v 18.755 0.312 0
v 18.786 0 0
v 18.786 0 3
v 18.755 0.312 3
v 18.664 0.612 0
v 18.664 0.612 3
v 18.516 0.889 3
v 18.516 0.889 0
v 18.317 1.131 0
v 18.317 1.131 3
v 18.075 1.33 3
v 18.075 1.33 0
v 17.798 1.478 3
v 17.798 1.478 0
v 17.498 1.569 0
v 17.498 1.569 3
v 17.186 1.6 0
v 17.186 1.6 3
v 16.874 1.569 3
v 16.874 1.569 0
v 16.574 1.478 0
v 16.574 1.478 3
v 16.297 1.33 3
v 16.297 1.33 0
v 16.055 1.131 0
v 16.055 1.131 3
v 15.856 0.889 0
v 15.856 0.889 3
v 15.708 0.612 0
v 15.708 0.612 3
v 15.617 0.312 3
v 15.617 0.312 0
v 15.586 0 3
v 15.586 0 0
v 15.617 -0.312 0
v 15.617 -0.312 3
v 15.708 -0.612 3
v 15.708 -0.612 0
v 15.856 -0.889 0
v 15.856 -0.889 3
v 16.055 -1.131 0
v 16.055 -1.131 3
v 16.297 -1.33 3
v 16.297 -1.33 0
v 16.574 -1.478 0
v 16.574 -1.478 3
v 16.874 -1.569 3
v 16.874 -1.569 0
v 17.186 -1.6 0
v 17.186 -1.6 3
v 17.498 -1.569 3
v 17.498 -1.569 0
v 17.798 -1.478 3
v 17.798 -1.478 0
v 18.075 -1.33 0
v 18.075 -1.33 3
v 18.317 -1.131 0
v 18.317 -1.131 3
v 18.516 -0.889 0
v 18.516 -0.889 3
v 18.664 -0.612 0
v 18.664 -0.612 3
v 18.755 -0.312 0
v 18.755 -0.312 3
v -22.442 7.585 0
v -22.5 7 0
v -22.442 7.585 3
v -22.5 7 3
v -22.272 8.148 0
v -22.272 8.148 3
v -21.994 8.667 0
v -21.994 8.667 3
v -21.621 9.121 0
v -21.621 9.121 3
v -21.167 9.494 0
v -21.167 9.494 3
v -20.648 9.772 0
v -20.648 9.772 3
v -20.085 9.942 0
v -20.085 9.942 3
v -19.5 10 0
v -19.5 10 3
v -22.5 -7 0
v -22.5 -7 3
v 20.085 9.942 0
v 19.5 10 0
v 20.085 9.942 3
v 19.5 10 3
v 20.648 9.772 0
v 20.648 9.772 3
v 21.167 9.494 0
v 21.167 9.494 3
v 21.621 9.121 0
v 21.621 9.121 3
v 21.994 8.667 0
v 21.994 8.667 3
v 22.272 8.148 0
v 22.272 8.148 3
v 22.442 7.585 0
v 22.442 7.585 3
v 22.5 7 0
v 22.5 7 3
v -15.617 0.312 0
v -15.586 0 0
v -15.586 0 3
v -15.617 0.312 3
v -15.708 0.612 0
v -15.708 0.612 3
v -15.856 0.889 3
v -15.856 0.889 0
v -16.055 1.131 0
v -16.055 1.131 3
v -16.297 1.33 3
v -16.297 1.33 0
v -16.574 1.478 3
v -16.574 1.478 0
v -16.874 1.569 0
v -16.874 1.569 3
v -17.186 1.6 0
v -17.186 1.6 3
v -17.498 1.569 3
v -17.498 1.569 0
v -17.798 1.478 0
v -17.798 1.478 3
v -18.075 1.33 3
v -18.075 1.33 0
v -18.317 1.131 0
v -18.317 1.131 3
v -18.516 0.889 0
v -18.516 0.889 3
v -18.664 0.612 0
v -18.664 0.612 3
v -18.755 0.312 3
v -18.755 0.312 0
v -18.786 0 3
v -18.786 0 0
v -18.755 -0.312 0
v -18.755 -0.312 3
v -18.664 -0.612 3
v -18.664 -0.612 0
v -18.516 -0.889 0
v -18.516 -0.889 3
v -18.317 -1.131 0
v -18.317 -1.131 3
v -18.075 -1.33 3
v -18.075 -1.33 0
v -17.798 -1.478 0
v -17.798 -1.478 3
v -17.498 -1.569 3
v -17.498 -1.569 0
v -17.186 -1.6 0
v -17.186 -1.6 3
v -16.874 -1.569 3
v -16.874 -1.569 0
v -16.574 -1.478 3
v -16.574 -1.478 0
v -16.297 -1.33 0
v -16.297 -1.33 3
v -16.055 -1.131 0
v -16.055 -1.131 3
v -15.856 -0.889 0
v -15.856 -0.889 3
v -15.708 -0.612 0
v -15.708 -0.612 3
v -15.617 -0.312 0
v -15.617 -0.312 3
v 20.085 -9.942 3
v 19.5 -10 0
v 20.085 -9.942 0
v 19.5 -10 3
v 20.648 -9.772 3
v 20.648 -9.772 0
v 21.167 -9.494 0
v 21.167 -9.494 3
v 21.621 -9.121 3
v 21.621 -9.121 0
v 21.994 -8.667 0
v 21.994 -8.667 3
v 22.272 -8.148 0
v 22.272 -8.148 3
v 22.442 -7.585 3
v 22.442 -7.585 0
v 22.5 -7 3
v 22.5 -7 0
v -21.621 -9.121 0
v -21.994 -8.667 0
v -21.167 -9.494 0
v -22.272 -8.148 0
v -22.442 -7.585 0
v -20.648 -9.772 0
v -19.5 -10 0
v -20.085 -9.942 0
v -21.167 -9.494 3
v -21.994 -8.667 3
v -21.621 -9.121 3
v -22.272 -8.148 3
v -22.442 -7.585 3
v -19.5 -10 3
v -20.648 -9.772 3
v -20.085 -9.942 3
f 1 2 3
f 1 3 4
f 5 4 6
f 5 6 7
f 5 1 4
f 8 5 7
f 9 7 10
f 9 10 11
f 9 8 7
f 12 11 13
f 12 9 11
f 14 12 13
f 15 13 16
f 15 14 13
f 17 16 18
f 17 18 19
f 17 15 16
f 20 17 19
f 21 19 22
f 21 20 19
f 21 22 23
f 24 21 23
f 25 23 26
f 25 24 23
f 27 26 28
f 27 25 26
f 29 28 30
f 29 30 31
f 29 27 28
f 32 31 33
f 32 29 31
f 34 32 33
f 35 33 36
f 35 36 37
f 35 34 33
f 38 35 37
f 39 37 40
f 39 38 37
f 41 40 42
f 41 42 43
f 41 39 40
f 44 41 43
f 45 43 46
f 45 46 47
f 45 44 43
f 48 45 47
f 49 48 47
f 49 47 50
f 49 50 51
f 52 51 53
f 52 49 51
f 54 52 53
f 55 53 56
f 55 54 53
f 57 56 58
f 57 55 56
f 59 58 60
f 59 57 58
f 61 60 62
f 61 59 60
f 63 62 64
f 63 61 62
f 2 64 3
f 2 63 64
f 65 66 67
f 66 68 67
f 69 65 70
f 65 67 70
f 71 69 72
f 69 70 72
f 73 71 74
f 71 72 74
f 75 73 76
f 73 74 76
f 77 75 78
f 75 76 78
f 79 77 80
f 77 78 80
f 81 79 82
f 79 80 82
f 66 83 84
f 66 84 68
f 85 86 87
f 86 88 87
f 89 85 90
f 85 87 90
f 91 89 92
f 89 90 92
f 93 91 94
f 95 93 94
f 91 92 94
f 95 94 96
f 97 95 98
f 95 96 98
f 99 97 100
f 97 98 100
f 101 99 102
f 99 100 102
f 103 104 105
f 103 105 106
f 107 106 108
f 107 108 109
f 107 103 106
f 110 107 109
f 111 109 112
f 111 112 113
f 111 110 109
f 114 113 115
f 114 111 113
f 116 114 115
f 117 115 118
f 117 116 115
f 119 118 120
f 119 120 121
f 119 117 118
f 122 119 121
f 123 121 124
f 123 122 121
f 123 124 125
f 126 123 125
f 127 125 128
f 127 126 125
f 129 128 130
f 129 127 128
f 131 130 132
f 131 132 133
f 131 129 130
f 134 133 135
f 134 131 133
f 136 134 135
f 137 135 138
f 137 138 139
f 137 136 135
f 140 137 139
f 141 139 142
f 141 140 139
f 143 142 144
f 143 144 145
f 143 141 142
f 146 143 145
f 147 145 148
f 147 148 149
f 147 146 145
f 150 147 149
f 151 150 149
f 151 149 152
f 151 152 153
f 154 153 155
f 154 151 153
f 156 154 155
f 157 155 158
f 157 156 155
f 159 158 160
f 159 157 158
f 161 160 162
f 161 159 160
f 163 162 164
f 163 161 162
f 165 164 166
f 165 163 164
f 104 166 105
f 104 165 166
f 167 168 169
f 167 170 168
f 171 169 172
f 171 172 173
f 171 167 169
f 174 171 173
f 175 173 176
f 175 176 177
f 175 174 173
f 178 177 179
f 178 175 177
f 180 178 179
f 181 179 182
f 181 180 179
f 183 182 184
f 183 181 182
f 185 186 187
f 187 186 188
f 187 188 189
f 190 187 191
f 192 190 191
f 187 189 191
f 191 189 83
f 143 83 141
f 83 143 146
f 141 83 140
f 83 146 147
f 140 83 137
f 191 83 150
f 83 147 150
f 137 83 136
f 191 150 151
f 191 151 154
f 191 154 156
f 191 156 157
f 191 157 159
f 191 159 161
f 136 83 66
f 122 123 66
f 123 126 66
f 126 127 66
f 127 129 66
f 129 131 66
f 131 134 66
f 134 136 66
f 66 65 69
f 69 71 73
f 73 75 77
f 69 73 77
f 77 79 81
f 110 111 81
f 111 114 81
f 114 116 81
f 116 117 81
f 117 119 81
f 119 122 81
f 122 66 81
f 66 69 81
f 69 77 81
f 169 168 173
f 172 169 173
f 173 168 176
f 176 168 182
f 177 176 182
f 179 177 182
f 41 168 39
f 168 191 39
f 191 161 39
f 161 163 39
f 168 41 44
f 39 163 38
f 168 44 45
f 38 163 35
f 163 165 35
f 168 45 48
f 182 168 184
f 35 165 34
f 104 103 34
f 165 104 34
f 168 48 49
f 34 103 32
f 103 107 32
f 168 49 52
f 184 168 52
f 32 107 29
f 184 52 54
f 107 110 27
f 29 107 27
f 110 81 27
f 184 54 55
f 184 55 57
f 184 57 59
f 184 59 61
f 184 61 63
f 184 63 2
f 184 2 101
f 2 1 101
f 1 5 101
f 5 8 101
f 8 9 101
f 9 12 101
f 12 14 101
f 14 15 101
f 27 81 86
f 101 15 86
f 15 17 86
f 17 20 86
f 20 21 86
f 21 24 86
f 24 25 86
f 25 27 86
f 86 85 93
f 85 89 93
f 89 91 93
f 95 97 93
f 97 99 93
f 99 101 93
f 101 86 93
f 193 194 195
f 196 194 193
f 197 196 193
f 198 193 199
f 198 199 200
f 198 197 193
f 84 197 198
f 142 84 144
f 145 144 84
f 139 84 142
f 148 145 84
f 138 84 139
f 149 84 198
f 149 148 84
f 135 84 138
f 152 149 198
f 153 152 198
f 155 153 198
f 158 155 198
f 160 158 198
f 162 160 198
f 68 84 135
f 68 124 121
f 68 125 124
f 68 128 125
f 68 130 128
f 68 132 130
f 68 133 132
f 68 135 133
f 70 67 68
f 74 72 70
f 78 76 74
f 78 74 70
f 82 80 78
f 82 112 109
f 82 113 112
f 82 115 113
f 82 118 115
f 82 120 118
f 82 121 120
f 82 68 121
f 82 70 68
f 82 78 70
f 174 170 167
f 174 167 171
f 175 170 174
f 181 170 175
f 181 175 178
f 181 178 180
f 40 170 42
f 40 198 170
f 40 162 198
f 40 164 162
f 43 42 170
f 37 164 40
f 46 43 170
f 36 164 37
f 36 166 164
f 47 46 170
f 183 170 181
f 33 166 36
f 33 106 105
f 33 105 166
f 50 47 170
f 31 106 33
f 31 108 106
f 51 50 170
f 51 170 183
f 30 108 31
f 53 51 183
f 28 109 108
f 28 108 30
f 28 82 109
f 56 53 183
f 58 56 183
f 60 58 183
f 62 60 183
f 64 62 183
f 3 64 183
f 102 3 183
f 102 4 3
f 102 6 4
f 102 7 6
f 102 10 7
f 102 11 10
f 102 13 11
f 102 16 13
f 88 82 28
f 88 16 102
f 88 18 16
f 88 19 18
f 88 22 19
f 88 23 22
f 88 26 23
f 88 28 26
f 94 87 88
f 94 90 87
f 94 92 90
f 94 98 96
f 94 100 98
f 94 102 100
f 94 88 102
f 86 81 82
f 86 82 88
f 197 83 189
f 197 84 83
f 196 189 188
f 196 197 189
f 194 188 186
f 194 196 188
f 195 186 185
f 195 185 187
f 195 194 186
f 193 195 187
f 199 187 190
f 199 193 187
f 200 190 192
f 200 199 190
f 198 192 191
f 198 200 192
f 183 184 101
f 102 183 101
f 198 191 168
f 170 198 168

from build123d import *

# Parameters (mm, degrees)
SKETCH_W  = 45
SKETCH_H  = 20
SKETCH_R  = 1.6
PAD_DEPTH = 3
FILLET_R  = 3


with BuildPart() as part:
    # Sketch → Pad (new body)
    with BuildSketch(Plane.XY):
        Rectangle(SKETCH_W, SKETCH_H)
        with Locations((-17.186, 0)):
            Circle(SKETCH_R, mode=Mode.SUBTRACT)
        with Locations((17.186, 0)):
            Circle(SKETCH_R, mode=Mode.SUBTRACT)
    extrude(amount=PAD_DEPTH)

    # Fillet
    fillet_edges = [part.edges().sort_by_distance(p)[0] for p in [
        (22.5, 10, 1.5),
        (22.5, -10, 1.5),
        (-22.5, -10, 1.5),
        (-22.5, 10, 1.5),
    ]]
    fillet(fillet_edges, radius=FILLET_R)


solid = part.part
